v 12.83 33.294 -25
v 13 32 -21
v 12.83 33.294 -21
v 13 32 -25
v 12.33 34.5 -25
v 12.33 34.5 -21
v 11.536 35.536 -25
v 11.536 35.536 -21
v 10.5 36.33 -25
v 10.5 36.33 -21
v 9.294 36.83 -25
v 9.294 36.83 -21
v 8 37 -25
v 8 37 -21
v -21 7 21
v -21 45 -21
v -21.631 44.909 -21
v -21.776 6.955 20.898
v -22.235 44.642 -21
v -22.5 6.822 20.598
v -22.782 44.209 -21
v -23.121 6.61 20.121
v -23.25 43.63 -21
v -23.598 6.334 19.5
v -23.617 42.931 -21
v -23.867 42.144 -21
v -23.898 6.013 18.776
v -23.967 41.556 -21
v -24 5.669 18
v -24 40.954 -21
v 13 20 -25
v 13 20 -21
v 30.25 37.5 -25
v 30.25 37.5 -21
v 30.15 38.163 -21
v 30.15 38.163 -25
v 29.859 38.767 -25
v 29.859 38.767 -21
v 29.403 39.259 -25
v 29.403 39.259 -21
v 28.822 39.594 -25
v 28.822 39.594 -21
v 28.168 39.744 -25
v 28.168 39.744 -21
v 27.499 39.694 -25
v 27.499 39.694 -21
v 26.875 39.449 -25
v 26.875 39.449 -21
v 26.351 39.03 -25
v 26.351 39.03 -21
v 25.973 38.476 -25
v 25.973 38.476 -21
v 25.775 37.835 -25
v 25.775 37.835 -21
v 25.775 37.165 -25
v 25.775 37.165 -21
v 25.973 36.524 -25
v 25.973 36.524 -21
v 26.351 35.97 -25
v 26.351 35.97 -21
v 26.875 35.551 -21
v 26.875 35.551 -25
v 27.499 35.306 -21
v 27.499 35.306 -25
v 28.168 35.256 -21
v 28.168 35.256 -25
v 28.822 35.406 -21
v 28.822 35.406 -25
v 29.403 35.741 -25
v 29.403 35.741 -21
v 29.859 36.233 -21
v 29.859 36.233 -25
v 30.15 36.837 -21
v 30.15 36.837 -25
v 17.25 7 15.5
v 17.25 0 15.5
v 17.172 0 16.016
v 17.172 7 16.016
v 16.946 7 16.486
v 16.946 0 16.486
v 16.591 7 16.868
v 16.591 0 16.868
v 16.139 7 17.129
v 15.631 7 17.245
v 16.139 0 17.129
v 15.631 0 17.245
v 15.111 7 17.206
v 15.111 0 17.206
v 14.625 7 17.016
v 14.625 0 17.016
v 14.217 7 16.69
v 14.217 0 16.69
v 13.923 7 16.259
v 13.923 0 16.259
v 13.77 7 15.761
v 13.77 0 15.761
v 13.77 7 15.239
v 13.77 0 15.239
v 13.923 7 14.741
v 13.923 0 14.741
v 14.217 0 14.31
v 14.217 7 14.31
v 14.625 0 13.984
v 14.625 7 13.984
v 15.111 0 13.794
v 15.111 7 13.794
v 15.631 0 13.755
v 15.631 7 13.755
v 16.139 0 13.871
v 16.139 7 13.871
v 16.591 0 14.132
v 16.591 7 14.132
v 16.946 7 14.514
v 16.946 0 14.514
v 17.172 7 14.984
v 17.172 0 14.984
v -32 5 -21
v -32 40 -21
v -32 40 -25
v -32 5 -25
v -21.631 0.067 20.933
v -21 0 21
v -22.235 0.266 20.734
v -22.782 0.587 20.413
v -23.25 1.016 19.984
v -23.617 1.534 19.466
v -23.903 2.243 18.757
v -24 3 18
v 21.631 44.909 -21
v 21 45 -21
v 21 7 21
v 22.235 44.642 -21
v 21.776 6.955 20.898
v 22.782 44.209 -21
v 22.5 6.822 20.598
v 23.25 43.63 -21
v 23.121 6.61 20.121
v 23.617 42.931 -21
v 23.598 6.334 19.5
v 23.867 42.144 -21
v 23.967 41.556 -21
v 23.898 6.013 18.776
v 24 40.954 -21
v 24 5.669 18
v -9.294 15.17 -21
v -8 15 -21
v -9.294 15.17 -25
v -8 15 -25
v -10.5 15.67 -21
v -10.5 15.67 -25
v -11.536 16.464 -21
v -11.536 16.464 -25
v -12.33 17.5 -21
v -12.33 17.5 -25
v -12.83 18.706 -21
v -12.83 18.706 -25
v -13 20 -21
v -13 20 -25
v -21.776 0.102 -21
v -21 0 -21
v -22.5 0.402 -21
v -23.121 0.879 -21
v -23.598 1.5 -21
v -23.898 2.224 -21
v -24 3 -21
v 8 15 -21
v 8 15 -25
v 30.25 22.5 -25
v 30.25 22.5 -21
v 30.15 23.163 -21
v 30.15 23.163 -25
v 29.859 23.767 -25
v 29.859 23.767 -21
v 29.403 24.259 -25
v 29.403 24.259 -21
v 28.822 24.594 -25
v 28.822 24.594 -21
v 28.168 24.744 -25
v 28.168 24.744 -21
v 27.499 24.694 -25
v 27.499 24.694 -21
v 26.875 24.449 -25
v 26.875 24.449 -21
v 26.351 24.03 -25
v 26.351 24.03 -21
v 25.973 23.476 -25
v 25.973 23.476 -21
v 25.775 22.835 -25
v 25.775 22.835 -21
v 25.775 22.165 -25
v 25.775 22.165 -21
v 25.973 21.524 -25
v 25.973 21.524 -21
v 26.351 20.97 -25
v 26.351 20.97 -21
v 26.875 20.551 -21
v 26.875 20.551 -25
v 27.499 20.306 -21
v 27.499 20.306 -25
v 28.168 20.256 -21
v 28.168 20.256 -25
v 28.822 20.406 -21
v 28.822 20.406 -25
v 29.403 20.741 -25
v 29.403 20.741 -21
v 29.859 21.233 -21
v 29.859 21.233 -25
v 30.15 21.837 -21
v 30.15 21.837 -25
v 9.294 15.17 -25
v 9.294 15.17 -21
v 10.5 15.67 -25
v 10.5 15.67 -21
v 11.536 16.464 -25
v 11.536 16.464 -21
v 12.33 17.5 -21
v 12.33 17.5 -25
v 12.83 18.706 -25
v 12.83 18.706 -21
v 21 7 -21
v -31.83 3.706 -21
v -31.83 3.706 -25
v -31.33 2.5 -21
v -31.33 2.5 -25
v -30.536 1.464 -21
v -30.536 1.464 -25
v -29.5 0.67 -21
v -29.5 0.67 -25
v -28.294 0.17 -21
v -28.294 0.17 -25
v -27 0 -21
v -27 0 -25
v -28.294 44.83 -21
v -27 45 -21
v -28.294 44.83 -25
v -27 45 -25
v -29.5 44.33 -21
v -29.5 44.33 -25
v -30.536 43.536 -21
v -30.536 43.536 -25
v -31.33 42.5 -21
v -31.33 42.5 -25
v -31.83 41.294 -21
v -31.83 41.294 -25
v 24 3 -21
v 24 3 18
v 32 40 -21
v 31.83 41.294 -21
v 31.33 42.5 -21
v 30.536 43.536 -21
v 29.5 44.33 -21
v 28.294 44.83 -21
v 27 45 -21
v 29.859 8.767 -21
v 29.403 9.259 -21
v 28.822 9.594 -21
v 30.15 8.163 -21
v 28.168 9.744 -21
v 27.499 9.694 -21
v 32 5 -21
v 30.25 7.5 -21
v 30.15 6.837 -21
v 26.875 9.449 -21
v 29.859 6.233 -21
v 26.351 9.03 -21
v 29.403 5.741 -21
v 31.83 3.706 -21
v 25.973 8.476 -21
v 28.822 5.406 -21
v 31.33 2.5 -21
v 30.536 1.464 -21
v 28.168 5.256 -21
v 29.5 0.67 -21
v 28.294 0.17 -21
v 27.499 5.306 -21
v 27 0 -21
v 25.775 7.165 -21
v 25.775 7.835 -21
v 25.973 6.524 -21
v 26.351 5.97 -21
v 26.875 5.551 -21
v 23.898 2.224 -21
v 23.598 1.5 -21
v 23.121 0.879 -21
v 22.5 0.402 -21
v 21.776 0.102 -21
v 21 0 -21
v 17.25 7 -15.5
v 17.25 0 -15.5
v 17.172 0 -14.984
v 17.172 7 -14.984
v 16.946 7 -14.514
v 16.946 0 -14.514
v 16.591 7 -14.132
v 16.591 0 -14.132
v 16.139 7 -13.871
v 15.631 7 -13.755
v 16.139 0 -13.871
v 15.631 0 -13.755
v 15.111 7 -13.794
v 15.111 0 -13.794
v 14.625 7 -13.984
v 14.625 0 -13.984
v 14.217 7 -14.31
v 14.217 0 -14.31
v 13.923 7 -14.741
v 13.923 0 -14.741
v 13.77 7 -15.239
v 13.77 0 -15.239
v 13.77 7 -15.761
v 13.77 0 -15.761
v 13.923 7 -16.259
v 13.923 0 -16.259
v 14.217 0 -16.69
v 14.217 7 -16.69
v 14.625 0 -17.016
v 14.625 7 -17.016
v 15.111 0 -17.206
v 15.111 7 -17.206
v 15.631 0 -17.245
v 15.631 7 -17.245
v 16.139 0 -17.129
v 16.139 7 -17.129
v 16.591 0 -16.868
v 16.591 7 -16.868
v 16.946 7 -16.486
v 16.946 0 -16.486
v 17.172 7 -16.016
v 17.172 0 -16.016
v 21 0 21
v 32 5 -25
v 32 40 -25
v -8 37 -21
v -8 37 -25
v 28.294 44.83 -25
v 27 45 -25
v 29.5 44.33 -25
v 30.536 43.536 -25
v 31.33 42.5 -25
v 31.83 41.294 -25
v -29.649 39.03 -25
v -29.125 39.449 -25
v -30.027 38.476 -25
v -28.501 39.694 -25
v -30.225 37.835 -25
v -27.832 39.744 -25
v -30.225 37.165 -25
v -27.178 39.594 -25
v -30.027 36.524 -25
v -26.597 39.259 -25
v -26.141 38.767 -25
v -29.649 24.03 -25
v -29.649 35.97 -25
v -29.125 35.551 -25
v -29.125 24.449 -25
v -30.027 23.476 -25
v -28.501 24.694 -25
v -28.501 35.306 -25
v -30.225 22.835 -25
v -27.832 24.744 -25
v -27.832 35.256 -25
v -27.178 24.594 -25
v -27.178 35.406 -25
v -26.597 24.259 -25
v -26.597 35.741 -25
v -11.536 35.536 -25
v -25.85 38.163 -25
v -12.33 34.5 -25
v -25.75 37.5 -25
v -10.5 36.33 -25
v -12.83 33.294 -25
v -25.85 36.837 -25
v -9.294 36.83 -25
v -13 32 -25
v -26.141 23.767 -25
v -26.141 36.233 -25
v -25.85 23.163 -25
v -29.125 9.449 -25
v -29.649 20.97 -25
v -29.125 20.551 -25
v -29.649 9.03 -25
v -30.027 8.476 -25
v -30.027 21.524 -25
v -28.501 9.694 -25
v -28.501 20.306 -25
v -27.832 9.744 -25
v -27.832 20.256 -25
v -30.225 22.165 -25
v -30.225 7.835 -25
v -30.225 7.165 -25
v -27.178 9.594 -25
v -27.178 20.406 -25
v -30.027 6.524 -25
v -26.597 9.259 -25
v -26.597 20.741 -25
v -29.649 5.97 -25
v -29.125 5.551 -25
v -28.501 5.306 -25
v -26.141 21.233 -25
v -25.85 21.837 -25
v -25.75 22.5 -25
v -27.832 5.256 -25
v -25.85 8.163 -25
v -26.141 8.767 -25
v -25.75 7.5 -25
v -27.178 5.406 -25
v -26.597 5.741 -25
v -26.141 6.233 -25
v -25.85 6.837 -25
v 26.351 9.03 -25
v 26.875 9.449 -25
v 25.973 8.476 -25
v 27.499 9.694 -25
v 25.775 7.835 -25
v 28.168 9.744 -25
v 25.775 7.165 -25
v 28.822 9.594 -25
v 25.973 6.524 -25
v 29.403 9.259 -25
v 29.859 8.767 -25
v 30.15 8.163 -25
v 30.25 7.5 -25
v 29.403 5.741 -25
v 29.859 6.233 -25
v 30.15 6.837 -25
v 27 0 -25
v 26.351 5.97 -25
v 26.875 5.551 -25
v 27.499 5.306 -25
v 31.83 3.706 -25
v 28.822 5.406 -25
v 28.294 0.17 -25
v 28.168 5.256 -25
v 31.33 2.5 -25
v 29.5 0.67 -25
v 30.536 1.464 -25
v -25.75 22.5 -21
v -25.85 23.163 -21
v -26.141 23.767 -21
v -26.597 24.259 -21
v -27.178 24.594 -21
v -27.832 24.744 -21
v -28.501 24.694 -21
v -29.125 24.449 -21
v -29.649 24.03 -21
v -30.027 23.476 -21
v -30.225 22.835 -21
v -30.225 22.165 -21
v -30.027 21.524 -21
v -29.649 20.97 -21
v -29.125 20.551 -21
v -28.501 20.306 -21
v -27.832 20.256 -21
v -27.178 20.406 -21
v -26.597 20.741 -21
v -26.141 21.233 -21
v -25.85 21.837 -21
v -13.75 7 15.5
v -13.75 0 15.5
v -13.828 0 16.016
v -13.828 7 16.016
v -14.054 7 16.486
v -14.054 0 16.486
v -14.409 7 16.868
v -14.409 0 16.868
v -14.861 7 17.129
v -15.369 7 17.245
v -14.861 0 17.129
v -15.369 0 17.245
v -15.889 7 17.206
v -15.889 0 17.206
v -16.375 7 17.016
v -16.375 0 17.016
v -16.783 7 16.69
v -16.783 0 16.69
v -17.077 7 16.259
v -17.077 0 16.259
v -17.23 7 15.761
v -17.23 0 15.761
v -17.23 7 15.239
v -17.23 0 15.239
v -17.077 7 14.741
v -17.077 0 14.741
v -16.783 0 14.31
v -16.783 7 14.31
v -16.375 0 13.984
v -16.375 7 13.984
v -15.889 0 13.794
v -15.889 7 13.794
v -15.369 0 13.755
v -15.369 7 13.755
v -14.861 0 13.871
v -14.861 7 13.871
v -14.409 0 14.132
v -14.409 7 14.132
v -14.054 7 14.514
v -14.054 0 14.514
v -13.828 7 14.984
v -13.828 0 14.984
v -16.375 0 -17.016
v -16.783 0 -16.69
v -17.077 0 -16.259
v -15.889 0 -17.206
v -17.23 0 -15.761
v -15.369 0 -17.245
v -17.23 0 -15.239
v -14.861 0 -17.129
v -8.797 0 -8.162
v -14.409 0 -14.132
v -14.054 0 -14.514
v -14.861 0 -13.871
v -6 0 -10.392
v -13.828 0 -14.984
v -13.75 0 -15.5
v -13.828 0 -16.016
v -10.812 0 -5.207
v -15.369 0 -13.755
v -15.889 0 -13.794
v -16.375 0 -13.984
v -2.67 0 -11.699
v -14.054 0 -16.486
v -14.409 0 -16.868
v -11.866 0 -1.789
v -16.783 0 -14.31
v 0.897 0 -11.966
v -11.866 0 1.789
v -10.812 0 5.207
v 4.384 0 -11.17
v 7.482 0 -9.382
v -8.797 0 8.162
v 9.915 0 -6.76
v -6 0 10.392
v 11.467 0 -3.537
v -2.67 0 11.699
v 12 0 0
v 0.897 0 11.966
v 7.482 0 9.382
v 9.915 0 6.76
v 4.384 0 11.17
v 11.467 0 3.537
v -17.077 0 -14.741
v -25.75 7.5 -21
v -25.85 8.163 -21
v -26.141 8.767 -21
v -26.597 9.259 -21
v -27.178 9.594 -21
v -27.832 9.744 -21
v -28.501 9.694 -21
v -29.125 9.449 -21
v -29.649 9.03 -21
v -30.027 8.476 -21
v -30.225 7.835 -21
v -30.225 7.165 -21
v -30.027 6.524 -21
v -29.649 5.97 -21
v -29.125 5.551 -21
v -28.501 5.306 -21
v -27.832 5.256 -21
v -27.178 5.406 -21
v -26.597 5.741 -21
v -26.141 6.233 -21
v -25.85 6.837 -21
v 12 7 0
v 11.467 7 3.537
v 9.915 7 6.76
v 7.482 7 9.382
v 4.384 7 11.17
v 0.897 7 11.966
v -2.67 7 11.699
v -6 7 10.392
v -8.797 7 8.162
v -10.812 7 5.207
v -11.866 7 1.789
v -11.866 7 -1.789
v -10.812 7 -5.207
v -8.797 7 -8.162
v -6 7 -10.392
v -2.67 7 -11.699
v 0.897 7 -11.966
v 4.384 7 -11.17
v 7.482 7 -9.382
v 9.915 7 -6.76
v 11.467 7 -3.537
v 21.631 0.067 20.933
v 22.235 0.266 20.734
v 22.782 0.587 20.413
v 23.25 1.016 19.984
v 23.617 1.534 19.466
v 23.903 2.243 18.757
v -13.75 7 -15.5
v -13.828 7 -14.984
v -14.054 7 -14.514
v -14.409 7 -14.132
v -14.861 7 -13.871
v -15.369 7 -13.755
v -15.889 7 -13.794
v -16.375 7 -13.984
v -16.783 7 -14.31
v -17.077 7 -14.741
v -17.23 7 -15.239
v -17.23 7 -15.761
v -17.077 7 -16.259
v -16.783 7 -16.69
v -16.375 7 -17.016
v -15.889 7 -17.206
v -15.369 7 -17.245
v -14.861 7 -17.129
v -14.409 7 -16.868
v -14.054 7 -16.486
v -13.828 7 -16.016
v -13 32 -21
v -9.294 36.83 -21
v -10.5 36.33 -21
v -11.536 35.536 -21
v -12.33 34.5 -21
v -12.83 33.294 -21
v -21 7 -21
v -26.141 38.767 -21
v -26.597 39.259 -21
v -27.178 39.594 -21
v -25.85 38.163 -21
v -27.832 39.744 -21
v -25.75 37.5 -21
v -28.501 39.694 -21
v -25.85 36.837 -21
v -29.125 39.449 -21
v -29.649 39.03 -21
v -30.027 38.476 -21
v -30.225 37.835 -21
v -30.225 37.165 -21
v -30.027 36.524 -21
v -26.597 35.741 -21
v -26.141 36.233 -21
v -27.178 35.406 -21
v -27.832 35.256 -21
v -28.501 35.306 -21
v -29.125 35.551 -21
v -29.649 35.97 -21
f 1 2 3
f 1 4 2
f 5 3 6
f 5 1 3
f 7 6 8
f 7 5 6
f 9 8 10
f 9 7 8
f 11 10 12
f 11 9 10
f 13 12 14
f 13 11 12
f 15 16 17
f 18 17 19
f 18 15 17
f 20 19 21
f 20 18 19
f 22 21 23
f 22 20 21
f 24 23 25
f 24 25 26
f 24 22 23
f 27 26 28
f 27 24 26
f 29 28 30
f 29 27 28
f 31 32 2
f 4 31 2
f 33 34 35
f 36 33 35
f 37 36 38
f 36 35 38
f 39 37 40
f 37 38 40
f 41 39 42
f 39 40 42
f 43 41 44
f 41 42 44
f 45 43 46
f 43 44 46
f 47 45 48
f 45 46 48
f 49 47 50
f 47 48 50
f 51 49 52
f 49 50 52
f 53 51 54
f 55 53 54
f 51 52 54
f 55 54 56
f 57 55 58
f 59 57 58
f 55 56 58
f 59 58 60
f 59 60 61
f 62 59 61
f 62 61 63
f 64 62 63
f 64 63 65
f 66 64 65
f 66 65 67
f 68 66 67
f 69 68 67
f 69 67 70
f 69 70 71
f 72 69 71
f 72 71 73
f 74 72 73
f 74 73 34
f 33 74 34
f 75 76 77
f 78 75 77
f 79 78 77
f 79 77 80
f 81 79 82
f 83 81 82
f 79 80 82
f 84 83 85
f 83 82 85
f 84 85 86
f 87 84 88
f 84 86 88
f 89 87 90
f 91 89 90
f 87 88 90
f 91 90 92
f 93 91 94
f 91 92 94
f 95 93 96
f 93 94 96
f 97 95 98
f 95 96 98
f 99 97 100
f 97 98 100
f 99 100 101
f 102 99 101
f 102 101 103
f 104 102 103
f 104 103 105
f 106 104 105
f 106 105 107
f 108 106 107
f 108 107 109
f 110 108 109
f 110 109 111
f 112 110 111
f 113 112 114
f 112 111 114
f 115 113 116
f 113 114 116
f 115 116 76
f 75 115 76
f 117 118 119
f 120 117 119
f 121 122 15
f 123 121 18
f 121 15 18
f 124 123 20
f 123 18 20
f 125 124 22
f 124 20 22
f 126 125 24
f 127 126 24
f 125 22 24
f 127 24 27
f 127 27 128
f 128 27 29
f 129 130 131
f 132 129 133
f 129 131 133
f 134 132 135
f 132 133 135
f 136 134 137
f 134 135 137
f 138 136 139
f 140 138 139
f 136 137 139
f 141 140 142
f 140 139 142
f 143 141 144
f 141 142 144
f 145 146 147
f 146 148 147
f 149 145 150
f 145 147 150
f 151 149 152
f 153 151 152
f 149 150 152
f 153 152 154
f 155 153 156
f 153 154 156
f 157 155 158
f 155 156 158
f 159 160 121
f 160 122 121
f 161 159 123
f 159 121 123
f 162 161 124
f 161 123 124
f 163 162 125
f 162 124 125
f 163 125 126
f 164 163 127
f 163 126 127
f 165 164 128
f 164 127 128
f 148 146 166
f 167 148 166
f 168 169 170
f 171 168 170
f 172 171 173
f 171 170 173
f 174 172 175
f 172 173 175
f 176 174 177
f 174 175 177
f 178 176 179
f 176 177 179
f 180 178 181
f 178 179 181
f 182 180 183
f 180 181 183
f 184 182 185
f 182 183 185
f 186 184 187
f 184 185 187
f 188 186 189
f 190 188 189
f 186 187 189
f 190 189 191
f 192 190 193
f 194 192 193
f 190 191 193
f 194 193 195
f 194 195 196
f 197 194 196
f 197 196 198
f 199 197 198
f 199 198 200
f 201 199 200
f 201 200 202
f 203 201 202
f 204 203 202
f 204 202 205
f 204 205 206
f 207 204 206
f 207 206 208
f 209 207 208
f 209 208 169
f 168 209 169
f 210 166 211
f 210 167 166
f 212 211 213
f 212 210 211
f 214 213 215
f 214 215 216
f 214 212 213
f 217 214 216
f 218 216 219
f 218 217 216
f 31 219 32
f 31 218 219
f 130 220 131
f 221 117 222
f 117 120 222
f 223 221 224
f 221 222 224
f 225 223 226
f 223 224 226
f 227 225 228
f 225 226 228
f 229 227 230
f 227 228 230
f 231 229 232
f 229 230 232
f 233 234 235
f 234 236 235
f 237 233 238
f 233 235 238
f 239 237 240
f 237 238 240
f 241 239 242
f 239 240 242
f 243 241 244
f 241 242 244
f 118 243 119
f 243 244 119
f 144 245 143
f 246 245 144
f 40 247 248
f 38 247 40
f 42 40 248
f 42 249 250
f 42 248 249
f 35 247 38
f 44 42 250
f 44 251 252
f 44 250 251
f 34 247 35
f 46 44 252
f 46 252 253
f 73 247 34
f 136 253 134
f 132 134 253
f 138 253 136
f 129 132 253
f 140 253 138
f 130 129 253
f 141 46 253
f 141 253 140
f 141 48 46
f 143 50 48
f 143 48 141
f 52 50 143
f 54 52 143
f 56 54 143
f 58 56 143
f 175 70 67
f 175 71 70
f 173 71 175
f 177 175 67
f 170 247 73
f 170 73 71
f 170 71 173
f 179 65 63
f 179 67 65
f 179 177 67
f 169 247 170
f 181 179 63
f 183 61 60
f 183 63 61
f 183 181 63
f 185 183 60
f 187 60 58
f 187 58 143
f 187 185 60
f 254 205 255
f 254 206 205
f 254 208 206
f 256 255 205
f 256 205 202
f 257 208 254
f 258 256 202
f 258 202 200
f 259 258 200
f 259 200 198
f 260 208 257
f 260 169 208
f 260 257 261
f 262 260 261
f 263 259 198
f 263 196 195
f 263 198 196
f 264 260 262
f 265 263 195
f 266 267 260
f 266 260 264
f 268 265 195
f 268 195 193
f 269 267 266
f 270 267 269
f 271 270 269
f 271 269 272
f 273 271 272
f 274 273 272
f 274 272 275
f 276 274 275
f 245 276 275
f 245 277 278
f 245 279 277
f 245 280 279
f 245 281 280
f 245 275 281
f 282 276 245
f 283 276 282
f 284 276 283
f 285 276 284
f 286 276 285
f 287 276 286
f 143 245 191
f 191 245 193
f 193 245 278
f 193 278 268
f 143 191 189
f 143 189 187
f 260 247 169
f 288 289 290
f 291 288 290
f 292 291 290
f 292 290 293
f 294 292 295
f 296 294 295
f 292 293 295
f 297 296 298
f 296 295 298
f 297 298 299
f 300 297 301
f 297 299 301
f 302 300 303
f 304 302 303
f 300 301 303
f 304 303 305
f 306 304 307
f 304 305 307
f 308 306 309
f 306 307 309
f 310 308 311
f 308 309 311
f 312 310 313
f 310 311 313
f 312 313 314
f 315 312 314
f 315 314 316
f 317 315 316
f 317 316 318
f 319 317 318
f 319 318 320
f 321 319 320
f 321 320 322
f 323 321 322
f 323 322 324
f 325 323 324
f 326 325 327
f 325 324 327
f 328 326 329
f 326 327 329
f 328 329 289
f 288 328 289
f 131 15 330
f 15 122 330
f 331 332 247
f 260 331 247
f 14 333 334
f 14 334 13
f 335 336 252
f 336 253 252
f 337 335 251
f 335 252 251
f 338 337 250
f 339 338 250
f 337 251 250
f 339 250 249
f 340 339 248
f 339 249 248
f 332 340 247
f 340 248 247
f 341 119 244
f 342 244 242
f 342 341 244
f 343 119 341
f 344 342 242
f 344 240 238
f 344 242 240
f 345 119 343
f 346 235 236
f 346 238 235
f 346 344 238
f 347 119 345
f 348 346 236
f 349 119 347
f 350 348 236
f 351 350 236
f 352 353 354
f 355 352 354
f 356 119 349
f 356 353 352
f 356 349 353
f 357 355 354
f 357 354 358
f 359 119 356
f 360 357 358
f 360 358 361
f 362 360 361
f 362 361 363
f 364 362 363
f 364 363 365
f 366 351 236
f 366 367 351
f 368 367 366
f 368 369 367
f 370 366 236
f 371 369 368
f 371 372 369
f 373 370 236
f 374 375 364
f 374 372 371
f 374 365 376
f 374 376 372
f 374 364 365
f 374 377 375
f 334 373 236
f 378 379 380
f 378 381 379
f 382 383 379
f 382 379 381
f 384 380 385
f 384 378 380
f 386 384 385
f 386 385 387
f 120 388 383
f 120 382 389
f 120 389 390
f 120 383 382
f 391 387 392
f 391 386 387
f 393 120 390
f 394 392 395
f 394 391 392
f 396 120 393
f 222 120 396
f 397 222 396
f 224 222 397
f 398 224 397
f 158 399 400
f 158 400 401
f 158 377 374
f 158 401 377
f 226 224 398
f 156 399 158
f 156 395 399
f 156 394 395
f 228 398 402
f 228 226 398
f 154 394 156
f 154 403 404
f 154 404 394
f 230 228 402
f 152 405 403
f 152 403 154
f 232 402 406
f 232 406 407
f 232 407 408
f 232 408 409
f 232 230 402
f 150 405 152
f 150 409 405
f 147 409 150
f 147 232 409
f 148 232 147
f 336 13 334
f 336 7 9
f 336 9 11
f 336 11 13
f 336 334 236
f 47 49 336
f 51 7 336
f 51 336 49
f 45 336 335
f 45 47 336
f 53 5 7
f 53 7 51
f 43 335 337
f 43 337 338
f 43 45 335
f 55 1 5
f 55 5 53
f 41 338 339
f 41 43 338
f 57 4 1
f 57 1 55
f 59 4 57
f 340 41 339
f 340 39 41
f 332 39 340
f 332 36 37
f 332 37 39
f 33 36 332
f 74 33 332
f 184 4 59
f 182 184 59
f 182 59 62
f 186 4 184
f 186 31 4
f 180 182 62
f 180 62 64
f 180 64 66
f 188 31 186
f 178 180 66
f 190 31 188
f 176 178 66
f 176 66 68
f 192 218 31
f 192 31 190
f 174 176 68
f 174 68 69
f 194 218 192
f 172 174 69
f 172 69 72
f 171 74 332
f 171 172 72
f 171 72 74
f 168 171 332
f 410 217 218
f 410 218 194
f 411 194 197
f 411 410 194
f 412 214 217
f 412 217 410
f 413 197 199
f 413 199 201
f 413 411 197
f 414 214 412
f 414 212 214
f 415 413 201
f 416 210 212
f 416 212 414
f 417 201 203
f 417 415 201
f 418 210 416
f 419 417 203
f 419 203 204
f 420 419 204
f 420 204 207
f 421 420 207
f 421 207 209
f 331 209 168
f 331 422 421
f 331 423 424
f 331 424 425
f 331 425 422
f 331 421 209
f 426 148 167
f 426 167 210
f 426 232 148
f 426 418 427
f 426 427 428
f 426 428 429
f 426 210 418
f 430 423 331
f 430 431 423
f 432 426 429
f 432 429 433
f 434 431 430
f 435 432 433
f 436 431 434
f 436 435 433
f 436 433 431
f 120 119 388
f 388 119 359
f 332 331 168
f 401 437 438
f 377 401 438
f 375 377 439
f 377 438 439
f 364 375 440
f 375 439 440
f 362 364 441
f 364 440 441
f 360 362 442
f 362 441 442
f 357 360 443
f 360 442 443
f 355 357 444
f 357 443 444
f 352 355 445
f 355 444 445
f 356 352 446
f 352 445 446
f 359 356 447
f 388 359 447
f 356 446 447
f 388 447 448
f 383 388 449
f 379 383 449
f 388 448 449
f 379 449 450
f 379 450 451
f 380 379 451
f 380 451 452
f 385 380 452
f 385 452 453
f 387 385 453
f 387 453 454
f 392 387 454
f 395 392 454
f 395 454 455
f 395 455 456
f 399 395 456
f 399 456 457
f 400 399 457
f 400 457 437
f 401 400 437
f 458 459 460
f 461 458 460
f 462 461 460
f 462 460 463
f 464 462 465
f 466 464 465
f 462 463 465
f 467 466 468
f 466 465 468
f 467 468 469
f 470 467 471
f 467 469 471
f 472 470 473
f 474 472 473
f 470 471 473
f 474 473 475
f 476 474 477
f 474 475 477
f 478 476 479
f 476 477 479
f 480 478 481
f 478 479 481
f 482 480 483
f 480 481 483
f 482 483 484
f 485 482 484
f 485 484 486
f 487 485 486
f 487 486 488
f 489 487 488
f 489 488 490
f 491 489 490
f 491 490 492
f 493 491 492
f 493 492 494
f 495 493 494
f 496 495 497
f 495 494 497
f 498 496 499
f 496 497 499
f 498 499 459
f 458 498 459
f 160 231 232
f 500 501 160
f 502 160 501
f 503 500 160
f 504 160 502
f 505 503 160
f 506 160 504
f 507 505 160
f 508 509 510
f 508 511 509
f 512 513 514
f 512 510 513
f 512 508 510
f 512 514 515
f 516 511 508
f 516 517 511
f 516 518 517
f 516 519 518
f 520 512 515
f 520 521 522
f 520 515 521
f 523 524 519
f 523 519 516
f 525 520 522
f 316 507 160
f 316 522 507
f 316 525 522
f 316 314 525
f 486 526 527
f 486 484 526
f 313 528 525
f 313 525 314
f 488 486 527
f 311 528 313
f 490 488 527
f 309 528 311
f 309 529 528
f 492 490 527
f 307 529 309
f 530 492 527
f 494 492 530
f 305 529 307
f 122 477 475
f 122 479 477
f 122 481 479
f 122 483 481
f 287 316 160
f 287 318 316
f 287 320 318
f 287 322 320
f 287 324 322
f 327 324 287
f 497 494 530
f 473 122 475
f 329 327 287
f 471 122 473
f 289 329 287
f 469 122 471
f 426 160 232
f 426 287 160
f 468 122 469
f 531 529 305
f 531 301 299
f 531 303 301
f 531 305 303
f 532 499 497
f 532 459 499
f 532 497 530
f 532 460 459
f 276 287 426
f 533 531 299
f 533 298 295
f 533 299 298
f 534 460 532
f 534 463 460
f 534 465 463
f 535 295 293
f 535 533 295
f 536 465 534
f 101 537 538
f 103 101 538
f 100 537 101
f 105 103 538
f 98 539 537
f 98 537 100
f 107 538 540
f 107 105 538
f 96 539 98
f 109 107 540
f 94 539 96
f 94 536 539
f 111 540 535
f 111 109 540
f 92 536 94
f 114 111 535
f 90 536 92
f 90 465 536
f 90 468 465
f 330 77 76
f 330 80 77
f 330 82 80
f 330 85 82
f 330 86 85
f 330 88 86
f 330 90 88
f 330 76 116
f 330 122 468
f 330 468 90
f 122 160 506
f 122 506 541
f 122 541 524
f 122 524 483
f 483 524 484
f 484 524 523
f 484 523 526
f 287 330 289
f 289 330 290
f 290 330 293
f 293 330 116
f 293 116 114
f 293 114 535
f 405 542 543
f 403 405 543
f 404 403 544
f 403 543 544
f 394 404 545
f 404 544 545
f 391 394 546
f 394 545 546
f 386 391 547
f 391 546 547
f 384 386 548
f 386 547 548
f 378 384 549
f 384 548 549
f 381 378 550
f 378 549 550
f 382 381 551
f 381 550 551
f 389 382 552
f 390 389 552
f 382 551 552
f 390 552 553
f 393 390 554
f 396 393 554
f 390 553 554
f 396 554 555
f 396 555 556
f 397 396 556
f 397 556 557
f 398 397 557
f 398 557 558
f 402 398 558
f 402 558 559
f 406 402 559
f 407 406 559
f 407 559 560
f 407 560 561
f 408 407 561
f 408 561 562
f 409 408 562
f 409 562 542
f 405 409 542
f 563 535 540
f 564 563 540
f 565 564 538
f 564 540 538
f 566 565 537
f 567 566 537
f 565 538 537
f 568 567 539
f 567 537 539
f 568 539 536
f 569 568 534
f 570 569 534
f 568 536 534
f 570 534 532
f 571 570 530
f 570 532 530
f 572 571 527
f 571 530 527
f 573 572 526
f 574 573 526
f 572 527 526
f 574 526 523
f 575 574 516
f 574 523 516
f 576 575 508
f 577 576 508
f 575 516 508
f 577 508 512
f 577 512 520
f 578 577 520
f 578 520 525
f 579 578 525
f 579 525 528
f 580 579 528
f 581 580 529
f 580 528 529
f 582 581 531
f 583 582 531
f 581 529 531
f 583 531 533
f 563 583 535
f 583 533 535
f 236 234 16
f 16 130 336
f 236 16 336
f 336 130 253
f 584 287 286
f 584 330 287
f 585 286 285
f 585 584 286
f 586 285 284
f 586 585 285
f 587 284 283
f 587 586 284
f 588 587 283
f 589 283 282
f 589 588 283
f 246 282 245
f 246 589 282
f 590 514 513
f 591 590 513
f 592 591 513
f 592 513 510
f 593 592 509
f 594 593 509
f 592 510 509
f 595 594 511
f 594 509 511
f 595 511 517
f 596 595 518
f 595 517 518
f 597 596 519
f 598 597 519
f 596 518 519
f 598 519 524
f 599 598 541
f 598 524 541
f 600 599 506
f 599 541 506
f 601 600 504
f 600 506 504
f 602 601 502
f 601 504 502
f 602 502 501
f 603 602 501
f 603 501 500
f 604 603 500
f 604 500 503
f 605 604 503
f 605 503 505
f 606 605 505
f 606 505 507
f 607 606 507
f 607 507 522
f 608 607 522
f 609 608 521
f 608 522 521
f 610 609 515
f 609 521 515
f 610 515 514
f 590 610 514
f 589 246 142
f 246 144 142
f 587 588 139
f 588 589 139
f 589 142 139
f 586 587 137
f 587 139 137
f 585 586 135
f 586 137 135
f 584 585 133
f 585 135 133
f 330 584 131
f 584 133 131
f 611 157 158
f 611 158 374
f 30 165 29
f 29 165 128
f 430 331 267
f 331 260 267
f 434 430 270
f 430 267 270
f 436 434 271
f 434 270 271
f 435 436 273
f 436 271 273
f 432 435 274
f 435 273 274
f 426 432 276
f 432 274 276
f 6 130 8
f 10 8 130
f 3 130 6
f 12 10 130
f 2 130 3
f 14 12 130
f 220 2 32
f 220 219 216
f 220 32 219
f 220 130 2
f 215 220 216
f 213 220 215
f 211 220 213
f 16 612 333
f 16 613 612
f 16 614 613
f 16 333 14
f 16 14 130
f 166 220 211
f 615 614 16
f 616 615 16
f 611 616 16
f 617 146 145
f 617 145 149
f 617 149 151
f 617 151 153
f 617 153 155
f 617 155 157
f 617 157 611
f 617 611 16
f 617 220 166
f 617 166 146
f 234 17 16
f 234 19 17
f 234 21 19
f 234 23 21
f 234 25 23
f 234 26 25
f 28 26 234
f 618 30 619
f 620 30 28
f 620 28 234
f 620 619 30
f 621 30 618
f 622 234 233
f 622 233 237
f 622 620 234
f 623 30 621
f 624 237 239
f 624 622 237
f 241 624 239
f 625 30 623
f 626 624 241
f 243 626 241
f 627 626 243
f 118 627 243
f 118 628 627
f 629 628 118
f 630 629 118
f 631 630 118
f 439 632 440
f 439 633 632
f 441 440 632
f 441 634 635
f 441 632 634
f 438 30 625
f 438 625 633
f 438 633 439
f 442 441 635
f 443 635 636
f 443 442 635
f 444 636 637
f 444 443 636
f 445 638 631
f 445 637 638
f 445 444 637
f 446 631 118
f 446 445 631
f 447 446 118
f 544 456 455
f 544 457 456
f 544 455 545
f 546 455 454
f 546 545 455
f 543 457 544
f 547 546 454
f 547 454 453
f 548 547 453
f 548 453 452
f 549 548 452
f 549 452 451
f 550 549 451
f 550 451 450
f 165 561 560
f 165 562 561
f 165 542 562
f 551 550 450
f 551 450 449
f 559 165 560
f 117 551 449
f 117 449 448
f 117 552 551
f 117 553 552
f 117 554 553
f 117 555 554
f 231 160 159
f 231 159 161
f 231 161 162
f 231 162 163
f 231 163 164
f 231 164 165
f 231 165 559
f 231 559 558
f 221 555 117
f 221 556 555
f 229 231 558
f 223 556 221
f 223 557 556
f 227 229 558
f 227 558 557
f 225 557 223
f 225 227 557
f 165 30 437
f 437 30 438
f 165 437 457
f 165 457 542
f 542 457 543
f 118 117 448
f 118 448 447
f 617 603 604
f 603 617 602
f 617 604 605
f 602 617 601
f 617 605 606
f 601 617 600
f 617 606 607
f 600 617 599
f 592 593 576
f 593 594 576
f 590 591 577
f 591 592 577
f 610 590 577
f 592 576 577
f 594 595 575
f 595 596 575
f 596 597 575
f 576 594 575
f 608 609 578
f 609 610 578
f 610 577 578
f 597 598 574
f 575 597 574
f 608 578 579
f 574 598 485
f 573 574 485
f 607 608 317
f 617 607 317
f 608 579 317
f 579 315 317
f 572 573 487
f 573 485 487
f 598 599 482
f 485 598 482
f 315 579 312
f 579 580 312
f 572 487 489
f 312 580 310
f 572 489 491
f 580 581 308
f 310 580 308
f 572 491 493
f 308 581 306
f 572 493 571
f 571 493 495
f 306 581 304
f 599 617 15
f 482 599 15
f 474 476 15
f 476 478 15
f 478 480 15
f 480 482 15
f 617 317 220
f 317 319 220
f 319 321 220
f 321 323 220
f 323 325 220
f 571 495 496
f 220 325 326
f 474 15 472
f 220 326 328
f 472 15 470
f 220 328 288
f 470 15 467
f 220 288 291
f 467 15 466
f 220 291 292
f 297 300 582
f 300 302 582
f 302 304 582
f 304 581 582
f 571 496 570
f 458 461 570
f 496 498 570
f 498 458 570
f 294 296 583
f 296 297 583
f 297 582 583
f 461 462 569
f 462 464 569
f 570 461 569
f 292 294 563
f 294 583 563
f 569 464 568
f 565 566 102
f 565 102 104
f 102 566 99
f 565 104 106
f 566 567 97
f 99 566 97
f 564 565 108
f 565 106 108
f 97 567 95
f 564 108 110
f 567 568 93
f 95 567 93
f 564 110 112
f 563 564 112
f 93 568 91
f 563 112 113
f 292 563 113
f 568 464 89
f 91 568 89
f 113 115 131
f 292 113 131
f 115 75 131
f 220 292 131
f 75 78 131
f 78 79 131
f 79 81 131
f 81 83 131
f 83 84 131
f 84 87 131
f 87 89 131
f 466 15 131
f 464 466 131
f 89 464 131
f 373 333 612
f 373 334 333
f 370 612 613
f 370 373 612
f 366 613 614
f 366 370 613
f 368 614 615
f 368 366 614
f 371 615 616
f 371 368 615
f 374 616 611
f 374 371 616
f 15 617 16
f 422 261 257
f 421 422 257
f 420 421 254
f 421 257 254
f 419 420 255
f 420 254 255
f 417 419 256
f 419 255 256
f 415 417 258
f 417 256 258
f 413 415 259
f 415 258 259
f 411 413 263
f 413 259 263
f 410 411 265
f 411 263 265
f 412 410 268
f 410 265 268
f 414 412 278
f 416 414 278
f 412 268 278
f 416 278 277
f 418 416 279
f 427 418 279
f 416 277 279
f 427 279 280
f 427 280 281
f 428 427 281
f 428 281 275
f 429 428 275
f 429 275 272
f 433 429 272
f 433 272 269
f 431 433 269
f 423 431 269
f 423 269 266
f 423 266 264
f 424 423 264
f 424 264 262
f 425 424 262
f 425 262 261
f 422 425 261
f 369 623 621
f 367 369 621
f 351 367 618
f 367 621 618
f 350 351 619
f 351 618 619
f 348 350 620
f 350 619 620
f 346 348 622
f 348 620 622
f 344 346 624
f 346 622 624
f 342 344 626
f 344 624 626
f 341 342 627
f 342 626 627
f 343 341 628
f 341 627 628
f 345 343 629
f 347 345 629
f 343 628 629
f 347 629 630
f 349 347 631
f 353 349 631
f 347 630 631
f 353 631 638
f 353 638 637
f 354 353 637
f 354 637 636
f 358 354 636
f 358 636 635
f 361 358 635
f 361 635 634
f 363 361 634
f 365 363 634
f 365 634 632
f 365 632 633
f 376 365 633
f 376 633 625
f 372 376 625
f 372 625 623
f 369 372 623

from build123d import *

# Parameters (mm, degrees)
F0_W      = 42
F0_H      = 42
F0_R      = 1.75
F0_R_2    = 12
F1_DEPTH  = 7
F0_W_2    = 3
F2_DEPTH  = 45
F3_DEPTH  = 45
F4_SIZE2  = 38
F4_SIZE   = 42
F5_R      = 2.25
F6_DEPTH  = 25
F7_R      = 5
F8_R      = 2.99999
F9_W      = 26
F9_H      = 22
F10_DEPTH = 25
F11_R     = 5


# Not quite as in the source:
# - a fillet or chamfer is up to 0.001 mm smaller than in the source, because OpenCascade refuses the exact size


with BuildPart() as f1:
    # F0 (on Front) → F1 (new body)
    with BuildSketch(Plane.XZ):
        Rectangle(F0_W, F0_H)
        with Locations((-15.5, -15.5)):
            Circle(F0_R, mode=Mode.SUBTRACT)
        with Locations((15.5, -15.5)):
            Circle(F0_R, mode=Mode.SUBTRACT)
        with Locations((-15.5, 15.5)):
            Circle(F0_R, mode=Mode.SUBTRACT)
        Circle(F0_R_2, mode=Mode.SUBTRACT)
        with Locations((15.5, 15.5)):
            Circle(F0_R, mode=Mode.SUBTRACT)
    extrude(amount=-F1_DEPTH)

    # F0 (on Front) → F2 (join)
    with BuildSketch(Plane.XZ):
        with Locations((22.5, 0)):
            Rectangle(F0_W_2, F0_H)
        with Locations((-22.5, 0)):
            Rectangle(F0_W_2, F0_H)
    extrude(amount=-F2_DEPTH)

    # F0 (on Front) → F3 (join, through all)
    with BuildSketch(Plane.XZ):
        Polygon((24, -21), (21, -21), (-21, -21), (-24, -21), (-32, -21), (-32, -25), (32, -25), (32, -21), align=None)
    extrude(amount=-F3_DEPTH)

    # F4
    f4_edges = [f1.edges().sort_by_distance(p)[0] for p in [
        (22.5, 45, 21),
        (-22.5, 45, 21),
    ]]
    f4_side = f1.faces().sort_by_distance((-31.211838, 45, -23))[0]
    chamfer(f4_edges, length=F4_SIZE, length2=F4_SIZE2, reference=f4_side)

    # F5 (on face) → F6 (cut)
    with BuildSketch(Plane.XY.offset(-21)):
        with Locations((28, 7.5)):
            Circle(F5_R)
        with Locations((28, 22.5)):
            Circle(F5_R)
        with Locations((28, 37.5)):
            Circle(F5_R)
        with Locations((-28, 7.5)):
            Circle(F5_R)
        with Locations((-28, 22.5)):
            Circle(F5_R)
        with Locations((-28, 37.5)):
            Circle(F5_R)
    extrude(amount=-F6_DEPTH, mode=Mode.SUBTRACT)

    # F7
    f7_edges = [f1.edges().sort_by_distance(p)[0] for p in [
        (-32, 0, -23),
        (-32, 45, -23),
        (32, 0, -23),
        (32, 45, -23),
    ]]
    fillet(f7_edges, radius=F7_R)

    # F8 (radius 3 in the source; OpenCascade refuses exactly that, so slightly less here)
    f8_edges = [f1.edges().sort_by_distance(p)[0] for p in [
        (24, 0, 0),
        (-24, 0, 0),
        (-24, 26, 0),
        (-24, 3.5, 21),
        (24, 3.5, 21),
        (24, 26, 0),
    ]]
    fillet(f8_edges, radius=F8_R)

    # F9 (on face) → F10 (cut)
    with BuildSketch(Plane.XY.offset(-21)):
        with Locations((0, 26)):
            Rectangle(F9_W, F9_H)
    extrude(amount=-F10_DEPTH, mode=Mode.SUBTRACT)

    # F11
    f11_edges = [f1.edges().sort_by_distance(p)[0] for p in [
        (13, 15, -23),
        (-13, 15, -23),
        (-13, 37, -23),
        (13, 37, -23),
    ]]
    fillet(f11_edges, radius=F11_R)


solid = f1.part
